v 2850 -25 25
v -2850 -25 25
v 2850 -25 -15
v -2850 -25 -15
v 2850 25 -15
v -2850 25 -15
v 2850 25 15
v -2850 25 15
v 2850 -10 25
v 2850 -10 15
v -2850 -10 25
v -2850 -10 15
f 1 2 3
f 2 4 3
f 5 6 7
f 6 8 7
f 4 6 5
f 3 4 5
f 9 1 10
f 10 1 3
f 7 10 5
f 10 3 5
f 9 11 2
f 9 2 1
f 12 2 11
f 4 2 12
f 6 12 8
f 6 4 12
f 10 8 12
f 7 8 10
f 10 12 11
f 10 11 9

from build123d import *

# Parameters (mm, degrees)
SKETCH_1_W      = 5700
SKETCH_1_H      = 50
EXTRUDE_1_DEPTH = 15
SKETCH_3_W      = 5700
SKETCH_3_H      = 15
EXTRUDE_3_DEPTH = 10


with BuildPart() as part:
    # 草图1 → 凸台-拉伸1 (new, symmetric)
    with BuildSketch(Plane.XY):
        Rectangle(SKETCH_1_W, SKETCH_1_H)
    extrude(amount=EXTRUDE_1_DEPTH, both=True)

    # 草图3 → 凸台-拉伸3 (add)
    with BuildSketch(Plane.XY.offset(15)):
        with Locations((0, -17.5)):
            Rectangle(SKETCH_3_W, SKETCH_3_H)
    extrude(amount=EXTRUDE_3_DEPTH)


solid = part.part
